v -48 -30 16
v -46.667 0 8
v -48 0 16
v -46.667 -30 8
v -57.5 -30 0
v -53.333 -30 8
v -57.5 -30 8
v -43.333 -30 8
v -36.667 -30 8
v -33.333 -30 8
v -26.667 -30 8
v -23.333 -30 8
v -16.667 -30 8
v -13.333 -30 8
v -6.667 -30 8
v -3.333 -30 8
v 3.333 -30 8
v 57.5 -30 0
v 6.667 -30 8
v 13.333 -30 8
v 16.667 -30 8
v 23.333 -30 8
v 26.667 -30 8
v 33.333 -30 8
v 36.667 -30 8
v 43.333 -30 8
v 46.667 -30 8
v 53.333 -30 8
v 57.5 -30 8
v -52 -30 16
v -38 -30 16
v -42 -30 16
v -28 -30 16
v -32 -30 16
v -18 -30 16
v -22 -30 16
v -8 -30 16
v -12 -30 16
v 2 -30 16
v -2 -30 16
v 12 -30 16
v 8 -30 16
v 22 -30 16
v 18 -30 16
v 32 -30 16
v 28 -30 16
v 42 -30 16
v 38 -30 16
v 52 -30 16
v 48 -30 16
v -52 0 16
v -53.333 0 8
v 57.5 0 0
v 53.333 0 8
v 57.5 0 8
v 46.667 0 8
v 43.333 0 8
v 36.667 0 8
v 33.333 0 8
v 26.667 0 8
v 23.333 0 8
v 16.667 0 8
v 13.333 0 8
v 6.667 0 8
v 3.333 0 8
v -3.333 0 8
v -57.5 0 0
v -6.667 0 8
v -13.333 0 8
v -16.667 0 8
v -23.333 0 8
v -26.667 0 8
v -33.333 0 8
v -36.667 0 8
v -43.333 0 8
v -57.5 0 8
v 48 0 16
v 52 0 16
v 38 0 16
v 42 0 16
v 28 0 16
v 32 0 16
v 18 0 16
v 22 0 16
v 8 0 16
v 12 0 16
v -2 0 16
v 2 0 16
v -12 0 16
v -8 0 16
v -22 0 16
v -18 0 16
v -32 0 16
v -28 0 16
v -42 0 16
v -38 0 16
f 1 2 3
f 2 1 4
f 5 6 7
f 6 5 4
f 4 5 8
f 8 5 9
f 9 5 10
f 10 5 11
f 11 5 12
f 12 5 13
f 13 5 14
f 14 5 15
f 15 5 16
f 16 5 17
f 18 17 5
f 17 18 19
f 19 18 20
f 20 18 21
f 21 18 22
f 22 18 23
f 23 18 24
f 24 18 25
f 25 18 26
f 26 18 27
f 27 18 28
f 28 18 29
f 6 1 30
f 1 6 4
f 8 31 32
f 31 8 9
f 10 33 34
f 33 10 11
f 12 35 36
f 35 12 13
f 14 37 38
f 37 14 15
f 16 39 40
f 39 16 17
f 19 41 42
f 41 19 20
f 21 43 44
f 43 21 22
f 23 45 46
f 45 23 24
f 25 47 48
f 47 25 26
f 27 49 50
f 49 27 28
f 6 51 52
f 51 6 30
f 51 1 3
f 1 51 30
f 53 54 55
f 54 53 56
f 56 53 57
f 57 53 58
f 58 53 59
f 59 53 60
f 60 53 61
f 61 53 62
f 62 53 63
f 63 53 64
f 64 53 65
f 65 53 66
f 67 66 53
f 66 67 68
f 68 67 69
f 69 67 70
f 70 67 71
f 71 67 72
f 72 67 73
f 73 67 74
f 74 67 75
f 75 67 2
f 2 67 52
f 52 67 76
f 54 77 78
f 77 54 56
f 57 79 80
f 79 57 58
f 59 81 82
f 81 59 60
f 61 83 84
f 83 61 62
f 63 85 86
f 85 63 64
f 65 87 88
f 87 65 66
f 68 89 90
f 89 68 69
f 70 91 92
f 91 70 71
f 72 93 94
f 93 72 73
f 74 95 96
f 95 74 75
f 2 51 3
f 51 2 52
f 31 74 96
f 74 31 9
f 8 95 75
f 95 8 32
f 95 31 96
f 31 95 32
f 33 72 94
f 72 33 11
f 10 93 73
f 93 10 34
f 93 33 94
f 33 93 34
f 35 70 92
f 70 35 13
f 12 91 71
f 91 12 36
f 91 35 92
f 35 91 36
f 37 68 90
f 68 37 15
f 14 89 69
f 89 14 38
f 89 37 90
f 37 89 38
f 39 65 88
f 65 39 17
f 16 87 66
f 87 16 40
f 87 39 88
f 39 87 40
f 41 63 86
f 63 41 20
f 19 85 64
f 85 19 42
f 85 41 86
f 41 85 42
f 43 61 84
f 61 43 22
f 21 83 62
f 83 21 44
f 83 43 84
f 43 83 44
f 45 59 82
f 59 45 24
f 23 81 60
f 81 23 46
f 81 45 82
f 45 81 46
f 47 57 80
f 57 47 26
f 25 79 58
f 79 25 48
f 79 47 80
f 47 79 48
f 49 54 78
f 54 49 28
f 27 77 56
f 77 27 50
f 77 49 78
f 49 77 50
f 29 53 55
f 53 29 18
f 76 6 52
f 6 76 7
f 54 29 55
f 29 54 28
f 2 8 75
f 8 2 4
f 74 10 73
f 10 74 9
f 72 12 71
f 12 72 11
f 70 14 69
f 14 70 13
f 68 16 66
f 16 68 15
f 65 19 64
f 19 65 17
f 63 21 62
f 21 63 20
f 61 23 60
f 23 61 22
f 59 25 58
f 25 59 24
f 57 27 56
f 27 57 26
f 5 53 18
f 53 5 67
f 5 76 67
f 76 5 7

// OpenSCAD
$fn = 32;

// ----------------------------------------------------------------------
// Toothed rack, 11 teeth
// 10 mm pitch, 8 mm teeth
// ----------------------------------------------------------------------

// --- parameters (mm) ---
bar_w = 30;   // bar width (Y)
bar_h = 8;    // bar height (Z)
teeth = 11;   // number of teeth
pitch = 10;   // tooth pitch
tooth_h = 8;  // tooth height above the bar
root_w = 7;   // tooth width at the root
crest_w = 4;  // tooth width at the crest

// --- derived feature positions (mm) ---
span = (teeth - 1) * pitch;  // = 100   distance between the outer teeth
bar_l = span + root_w + 8;   // = 115   bar length: teeth plus 4 mm at each end
tooth_x = -span / 2;         // = -50   X of the first tooth
height = bar_h + tooth_h;    // = 16   overall height
feature_centers = [
  [tooth_x + 0 * pitch, -bar_w / 2],
  [tooth_x + 1 * pitch, -bar_w / 2],
  [tooth_x + 2 * pitch, -bar_w / 2],
  [tooth_x + 3 * pitch, -bar_w / 2],
  [tooth_x + 4 * pitch, -bar_w / 2],
  [tooth_x + 5 * pitch, -bar_w / 2],
  [tooth_x + 6 * pitch, -bar_w / 2],
  [tooth_x + 7 * pitch, -bar_w / 2],
  [tooth_x + 8 * pitch, -bar_w / 2],
  [tooth_x + 9 * pitch, -bar_w / 2],
  [tooth_x + 10 * pitch, -bar_w / 2]
];   // tooth centre line, drives the tooth loop

// bar with a rack of teeth, one extruded trapezoium per centre
module rack_tooth() {
  linear_extrude(height = bar_w)
    polygon(points = [
      [0, 0],
      [root_w, 0],
      [root_w / 2 + crest_w / 2, tooth_h + 1],
      [root_w / 2 - crest_w / 2, tooth_h + 1]
    ]);
}

union() {
  translate([-bar_l / 2, -bar_w, 0]) cube([bar_l, bar_w, bar_h]);
  for (centre = feature_centers)
    translate([centre[0] - root_w / 2, 0, bar_h - 1]) rotate([90, 0, 0]) rack_tooth();
}
